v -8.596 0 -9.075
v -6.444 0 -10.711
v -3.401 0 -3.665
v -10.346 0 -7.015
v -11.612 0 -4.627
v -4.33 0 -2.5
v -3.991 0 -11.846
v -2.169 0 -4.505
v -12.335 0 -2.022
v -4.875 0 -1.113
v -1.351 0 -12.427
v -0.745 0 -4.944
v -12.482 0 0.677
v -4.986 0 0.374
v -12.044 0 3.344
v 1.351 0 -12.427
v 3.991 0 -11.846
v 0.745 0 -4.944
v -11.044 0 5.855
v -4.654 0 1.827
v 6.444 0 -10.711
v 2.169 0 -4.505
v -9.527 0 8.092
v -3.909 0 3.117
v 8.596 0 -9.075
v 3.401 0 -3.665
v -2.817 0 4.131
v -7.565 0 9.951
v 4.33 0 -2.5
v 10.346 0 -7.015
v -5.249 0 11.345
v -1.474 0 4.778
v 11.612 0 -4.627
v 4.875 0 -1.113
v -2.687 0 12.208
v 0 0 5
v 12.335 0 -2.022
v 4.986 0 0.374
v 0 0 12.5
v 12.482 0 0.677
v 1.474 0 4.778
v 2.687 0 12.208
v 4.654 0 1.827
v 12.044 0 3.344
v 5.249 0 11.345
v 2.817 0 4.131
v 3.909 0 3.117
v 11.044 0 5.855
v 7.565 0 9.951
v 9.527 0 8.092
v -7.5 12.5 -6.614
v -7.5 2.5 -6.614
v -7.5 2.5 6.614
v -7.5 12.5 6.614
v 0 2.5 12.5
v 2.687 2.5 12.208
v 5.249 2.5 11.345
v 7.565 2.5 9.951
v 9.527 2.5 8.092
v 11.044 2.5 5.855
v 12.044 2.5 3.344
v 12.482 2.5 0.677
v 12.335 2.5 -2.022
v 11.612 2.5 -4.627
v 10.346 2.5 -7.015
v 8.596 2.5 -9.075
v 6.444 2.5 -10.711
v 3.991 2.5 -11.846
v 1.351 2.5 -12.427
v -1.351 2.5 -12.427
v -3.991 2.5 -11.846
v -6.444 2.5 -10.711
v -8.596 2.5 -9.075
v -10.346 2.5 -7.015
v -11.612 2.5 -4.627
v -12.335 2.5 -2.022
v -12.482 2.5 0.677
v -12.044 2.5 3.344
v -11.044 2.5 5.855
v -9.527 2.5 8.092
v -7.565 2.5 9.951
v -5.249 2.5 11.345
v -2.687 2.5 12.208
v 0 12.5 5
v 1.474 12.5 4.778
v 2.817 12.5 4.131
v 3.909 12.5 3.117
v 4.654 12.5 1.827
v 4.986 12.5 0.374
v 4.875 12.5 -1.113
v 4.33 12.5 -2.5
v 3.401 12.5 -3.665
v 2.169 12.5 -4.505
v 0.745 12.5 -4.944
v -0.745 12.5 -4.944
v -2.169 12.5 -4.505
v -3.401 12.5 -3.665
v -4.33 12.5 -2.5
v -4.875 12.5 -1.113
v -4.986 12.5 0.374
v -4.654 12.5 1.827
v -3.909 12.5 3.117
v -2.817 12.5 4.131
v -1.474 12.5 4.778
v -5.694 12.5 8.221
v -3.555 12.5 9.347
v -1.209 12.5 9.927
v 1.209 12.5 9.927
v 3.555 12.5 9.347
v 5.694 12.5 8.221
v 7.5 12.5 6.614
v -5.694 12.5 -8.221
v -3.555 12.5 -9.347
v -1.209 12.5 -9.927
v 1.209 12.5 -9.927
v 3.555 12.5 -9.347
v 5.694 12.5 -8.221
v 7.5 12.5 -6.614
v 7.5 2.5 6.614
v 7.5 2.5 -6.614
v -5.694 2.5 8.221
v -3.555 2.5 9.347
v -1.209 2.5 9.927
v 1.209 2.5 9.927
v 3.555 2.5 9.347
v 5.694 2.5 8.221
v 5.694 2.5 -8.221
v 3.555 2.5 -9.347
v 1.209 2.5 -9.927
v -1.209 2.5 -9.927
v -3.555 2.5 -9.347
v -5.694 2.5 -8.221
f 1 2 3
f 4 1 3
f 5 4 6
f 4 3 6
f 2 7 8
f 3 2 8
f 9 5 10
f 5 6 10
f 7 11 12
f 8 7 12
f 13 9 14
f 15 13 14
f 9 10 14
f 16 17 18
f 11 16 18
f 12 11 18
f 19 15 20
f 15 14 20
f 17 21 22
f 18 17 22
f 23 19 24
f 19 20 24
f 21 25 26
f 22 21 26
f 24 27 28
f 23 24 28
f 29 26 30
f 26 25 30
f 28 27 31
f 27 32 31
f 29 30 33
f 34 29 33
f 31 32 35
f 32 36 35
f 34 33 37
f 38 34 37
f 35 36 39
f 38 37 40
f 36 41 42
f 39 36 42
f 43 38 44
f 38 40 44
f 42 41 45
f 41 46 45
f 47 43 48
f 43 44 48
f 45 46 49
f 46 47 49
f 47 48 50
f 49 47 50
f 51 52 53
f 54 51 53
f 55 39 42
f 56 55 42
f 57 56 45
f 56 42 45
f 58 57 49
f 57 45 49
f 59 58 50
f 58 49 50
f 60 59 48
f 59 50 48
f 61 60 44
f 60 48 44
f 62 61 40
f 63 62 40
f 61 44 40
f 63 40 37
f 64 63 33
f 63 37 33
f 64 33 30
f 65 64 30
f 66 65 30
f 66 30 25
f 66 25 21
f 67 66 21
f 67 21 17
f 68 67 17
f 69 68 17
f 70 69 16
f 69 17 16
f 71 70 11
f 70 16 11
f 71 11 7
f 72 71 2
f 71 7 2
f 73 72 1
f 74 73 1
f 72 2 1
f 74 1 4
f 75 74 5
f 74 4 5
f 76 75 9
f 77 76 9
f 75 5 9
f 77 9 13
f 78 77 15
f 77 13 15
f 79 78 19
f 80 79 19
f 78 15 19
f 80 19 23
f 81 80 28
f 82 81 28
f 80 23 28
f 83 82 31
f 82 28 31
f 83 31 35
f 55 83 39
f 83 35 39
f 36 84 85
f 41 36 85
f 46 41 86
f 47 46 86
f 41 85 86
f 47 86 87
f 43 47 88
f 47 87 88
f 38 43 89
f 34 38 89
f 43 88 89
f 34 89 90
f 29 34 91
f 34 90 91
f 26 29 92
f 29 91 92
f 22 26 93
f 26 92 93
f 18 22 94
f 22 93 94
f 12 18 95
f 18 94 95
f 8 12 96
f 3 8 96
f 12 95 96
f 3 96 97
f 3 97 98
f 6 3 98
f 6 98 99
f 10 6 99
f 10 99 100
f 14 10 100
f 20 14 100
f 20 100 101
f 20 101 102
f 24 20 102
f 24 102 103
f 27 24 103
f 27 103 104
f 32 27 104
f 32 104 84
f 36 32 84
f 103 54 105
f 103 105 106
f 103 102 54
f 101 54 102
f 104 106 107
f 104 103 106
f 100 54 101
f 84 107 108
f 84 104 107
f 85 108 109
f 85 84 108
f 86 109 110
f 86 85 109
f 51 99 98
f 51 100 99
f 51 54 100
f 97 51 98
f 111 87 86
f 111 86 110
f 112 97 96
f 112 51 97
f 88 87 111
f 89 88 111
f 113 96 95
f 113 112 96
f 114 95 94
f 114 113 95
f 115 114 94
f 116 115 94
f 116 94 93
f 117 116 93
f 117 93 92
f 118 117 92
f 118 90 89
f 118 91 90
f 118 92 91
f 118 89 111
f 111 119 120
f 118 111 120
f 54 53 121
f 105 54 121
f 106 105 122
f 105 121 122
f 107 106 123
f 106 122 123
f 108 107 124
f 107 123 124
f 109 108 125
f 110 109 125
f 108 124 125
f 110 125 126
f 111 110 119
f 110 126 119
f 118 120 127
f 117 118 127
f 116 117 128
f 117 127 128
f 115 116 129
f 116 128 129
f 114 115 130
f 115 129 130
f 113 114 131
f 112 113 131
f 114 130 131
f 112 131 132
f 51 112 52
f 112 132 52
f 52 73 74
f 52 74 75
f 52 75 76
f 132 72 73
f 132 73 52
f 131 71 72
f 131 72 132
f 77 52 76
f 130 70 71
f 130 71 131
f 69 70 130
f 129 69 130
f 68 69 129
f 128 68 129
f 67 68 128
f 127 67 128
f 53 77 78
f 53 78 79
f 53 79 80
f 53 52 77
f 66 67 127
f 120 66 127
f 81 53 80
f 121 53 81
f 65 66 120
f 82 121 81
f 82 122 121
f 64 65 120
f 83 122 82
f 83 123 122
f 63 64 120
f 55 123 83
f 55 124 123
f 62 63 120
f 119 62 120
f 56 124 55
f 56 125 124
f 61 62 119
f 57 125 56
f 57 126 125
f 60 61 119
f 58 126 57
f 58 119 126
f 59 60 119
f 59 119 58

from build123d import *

# Parameters (mm, degrees)
CROQUIS1_R              = 12.5
SALIENTE_EXTRUIR1_DEPTH = 2.5
SALIENTE_EXTRUIR2_DEPTH = 10
CROQUIS3_R              = 5
CORTAR_EXTRUIR1_DEPTH   = 22.650635095


with BuildPart() as part:
    # Croquis1 → Saliente-Extruir1 (new body)
    with BuildSketch(Plane(origin=(0, 0, 0), x_dir=(1, 0, 0), z_dir=(0, 1, 0))):
        with Locations(Location((0, 0, 0), (0, 0, 270))):
            Circle(CROQUIS1_R)
    extrude(amount=SALIENTE_EXTRUIR1_DEPTH)

    # Croquis2 → Saliente-Extruir2 (add)
    with BuildSketch(Plane(origin=(0, 2.5, 0), x_dir=(1, 0, 0), z_dir=(0, 1, 0))):
        with BuildLine():
            Line((-7.5, 6.614378278), (-7.5, -6.614378278))
            ThreePointArc((-7.5, -6.614378278), (0, -10), (7.5, -6.614378278))
            Line((7.5, -6.614378278), (7.5, 6.614378278))
            ThreePointArc((7.5, 6.614378278), (0, 10), (-7.5, 6.614378278))
        make_face()
    extrude(amount=SALIENTE_EXTRUIR2_DEPTH)

    # Croquis3 → Cortar-Extruir1 (cut, through all)
    with BuildSketch(Plane(origin=(0, 12.5, 0), x_dir=(1, 0, 0), z_dir=(0, 1, 0))):
        with Locations(Location((0, 0, 0), (0, 0, 270))):
            Circle(CROQUIS3_R)
    extrude(amount=-CORTAR_EXTRUIR1_DEPTH, mode=Mode.SUBTRACT)


solid = part.part
